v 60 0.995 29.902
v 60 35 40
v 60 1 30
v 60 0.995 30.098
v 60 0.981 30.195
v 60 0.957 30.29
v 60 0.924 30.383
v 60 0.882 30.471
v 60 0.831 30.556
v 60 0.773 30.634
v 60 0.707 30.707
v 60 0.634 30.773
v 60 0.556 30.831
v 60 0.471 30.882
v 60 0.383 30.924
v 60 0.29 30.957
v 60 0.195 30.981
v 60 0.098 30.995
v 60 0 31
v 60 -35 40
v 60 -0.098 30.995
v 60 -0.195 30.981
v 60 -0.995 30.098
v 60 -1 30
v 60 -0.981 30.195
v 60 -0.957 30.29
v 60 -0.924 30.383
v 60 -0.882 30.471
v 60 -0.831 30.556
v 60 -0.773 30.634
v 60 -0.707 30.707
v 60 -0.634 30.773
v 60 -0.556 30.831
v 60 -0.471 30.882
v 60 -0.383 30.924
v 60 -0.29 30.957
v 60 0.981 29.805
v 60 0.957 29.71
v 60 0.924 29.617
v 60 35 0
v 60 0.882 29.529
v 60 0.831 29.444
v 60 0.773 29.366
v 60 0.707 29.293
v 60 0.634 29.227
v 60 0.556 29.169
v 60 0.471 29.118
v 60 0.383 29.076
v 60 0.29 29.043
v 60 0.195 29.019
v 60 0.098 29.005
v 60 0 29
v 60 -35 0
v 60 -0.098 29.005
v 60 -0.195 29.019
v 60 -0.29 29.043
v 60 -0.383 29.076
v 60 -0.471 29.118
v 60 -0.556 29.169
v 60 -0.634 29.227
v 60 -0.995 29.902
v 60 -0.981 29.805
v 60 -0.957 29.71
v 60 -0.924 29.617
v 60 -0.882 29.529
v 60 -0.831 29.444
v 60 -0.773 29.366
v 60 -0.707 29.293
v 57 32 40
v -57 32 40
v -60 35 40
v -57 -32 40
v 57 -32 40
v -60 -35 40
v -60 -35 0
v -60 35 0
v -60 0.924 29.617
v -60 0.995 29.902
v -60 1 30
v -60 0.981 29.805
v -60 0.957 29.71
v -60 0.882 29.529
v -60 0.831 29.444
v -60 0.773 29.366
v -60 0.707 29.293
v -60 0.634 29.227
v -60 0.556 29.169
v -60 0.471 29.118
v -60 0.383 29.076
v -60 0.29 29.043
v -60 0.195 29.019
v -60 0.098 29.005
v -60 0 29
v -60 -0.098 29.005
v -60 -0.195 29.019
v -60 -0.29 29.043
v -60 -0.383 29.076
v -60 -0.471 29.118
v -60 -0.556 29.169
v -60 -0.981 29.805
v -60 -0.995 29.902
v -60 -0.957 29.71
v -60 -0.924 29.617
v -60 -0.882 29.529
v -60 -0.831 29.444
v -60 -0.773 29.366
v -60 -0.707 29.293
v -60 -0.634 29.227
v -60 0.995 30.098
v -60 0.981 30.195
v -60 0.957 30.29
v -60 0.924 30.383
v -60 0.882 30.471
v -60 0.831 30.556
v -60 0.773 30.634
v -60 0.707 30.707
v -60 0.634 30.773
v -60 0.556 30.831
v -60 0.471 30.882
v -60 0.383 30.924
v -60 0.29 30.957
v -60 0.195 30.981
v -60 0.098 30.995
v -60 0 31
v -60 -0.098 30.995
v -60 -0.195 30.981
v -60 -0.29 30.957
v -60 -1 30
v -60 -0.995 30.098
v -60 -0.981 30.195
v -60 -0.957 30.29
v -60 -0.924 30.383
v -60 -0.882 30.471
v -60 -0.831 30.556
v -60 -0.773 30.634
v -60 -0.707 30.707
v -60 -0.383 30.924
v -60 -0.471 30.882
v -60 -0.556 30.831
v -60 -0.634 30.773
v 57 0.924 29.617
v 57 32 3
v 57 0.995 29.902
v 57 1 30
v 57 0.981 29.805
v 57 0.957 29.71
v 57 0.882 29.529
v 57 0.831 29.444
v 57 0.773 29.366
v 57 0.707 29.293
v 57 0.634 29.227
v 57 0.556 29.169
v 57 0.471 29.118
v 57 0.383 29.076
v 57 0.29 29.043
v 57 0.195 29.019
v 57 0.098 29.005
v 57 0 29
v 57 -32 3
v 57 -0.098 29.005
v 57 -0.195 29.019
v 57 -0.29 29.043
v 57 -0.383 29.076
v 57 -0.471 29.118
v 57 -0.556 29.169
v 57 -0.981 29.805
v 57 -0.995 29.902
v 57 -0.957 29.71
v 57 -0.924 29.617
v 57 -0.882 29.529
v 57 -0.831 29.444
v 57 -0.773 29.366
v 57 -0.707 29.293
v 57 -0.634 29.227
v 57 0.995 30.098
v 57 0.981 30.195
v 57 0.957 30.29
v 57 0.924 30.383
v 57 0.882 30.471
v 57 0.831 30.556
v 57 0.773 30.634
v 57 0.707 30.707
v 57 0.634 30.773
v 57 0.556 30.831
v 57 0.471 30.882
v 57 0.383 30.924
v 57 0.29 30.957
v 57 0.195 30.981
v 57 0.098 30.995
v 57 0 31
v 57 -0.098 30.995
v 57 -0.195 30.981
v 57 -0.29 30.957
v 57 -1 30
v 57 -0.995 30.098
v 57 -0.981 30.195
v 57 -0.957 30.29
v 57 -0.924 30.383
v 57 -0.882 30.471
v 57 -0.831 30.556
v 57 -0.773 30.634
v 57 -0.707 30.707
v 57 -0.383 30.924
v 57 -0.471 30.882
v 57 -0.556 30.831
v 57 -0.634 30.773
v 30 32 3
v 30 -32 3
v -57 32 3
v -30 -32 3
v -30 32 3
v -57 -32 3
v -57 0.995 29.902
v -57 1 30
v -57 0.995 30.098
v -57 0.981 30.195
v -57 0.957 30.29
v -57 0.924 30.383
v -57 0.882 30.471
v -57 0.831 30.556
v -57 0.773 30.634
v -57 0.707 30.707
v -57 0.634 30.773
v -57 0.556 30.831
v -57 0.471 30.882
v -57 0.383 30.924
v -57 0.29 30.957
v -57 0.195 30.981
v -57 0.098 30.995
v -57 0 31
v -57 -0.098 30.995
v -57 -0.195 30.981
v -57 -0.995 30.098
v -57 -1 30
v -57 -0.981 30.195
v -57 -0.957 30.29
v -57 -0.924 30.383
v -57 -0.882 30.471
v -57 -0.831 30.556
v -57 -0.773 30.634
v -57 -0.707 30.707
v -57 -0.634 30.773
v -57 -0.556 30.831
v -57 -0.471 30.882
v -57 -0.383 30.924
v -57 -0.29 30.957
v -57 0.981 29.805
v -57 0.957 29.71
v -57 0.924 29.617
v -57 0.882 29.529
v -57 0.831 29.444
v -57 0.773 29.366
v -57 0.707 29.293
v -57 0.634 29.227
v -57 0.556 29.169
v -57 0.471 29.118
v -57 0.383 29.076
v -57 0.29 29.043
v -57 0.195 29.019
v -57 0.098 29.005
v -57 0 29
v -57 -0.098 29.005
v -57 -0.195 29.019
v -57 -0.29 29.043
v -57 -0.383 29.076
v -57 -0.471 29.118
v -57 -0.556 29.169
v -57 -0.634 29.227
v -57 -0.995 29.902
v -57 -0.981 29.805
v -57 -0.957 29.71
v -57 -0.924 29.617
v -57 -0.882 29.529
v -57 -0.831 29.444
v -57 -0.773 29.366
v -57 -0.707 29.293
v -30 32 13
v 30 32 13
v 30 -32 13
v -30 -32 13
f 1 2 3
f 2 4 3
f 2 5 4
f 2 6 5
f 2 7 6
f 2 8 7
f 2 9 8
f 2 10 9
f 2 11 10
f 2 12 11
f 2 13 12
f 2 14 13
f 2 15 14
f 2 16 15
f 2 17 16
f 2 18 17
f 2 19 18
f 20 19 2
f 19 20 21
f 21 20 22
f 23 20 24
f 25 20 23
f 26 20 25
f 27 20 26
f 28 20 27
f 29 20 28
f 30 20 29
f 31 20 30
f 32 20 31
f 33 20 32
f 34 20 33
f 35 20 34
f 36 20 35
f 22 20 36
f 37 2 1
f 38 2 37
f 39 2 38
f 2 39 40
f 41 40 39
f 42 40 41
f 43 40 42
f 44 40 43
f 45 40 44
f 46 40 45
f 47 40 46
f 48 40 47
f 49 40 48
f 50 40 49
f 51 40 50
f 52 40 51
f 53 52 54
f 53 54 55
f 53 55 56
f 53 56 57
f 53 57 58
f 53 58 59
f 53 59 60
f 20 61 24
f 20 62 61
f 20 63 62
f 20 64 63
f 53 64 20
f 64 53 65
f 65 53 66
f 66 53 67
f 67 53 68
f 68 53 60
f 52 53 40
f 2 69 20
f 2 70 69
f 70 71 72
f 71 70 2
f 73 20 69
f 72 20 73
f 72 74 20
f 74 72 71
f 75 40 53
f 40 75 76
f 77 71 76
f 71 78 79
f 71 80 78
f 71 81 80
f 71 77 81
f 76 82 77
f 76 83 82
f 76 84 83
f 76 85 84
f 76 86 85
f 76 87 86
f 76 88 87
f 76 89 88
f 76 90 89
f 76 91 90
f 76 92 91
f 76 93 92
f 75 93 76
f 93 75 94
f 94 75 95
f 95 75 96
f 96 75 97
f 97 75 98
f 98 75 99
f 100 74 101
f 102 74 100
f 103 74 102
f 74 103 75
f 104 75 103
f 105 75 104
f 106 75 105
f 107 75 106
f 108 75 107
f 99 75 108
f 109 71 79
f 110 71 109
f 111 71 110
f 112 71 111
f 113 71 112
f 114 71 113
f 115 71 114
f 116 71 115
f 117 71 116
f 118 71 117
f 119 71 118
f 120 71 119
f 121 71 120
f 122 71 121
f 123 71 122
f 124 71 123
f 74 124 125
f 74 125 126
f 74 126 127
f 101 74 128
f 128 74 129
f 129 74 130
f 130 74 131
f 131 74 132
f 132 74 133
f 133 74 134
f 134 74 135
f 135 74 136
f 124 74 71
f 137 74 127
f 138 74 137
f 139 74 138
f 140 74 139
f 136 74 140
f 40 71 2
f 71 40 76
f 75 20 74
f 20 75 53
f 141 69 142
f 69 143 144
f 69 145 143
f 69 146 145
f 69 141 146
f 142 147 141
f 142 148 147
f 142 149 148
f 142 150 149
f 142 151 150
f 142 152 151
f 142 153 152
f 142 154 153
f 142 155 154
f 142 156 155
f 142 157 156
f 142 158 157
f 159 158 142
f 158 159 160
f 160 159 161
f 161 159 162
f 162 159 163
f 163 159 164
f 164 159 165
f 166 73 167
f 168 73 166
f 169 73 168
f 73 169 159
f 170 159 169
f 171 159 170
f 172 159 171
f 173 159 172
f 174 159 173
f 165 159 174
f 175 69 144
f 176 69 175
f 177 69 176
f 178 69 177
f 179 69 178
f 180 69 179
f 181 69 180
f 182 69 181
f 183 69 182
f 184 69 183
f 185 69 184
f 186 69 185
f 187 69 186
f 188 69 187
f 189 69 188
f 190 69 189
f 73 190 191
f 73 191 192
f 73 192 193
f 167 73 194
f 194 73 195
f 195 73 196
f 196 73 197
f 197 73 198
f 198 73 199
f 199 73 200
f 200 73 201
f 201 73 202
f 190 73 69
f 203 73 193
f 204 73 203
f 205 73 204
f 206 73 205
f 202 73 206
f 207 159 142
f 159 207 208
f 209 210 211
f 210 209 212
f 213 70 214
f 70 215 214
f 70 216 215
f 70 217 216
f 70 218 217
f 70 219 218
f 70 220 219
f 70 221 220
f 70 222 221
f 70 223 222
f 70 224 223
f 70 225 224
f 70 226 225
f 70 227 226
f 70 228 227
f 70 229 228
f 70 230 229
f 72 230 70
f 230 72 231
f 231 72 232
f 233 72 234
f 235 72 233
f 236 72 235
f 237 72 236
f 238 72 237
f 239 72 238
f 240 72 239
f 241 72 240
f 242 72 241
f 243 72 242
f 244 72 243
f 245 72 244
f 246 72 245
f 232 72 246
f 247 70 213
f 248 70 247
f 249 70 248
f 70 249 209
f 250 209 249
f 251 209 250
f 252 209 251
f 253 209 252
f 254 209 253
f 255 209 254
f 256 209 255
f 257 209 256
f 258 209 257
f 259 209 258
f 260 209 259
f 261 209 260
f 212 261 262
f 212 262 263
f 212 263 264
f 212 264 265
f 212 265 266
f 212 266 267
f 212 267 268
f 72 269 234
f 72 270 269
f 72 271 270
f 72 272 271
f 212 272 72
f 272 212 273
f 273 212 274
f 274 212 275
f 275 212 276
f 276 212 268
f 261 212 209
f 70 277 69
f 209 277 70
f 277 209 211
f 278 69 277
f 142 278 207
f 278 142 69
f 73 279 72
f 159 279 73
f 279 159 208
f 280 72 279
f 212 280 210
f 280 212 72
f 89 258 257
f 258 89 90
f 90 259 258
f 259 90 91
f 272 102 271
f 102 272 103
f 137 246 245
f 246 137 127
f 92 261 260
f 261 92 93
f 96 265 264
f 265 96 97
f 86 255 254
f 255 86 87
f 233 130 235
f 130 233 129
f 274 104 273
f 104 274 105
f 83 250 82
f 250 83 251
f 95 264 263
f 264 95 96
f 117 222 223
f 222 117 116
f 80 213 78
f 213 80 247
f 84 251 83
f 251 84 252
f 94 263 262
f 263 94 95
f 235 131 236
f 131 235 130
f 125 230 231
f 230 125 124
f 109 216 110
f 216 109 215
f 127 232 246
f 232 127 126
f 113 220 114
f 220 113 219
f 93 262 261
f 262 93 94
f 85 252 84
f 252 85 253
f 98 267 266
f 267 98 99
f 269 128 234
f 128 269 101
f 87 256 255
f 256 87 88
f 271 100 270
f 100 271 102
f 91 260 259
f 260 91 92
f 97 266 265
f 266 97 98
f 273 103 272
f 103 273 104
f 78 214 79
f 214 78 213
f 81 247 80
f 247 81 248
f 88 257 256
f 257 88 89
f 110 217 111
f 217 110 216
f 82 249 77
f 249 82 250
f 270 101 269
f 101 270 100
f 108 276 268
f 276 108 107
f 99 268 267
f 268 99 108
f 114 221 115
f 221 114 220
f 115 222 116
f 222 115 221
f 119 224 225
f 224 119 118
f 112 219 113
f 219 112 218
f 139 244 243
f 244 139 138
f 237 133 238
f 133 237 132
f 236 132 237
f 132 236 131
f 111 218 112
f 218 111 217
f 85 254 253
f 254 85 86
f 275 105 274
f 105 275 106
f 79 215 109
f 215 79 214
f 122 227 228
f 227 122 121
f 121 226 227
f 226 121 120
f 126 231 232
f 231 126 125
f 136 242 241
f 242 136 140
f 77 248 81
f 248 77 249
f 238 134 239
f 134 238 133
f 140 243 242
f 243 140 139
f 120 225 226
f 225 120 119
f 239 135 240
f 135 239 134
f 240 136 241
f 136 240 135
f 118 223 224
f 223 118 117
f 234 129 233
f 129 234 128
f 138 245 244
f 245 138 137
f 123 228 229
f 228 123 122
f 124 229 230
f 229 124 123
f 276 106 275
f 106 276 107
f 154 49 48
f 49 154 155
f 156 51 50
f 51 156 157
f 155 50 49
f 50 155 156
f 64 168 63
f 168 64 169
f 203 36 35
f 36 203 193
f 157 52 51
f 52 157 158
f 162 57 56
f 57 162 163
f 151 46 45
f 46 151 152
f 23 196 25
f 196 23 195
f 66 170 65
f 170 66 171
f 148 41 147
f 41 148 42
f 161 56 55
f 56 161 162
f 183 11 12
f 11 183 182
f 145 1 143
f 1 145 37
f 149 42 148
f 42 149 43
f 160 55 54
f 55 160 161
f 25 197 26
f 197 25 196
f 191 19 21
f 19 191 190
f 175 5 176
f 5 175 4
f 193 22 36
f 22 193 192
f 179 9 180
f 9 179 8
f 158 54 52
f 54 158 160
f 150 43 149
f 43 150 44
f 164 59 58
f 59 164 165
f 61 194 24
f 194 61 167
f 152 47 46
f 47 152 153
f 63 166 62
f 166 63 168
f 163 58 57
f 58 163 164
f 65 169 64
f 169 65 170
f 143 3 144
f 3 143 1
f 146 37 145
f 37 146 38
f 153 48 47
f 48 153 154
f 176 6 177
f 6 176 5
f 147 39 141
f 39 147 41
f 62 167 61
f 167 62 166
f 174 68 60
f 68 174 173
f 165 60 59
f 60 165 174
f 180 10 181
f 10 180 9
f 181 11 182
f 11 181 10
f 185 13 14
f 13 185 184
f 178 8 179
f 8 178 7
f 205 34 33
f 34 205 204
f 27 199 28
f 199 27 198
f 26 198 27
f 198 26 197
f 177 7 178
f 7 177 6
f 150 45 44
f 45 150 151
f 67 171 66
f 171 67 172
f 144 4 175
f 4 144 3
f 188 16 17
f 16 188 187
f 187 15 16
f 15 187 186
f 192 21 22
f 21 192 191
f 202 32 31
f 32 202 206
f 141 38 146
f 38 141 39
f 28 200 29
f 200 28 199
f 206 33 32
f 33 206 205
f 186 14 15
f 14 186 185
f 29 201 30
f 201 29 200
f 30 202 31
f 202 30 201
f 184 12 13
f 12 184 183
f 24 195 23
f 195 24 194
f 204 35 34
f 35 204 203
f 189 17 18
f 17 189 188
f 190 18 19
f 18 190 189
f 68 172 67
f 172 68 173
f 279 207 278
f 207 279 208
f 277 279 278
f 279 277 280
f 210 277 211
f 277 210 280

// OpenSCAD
// Buffer tank for mini gel-electrophoresis box

// Dimensions (mm)
outer_x = 120;          // outer width in X
outer_y = 70;           // outer depth in Y
outer_z = 40;           // outer height in Z
wall_t = 3;             // wall thickness
floor_t = 3;            // floor thickness
platform_len_x = 60;    // platform length in X (centered)
platform_top_z = 13;    // platform top height
electrode_hole_d = 2;   // electrode hole diameter
electrode_hole_z = 30;  // electrode hole height

// Calculated dimensions
inner_x = outer_x - 2 * wall_t;
inner_y = outer_y - 2 * wall_t;

// Tank center positions
tank_x_min = -outer_x / 2;
tank_x_max = outer_x / 2;
tank_y_min = -outer_y / 2;
tank_y_max = outer_y / 2;

// Inner cavity positions
inner_x_min = tank_x_min + wall_t;
inner_x_max = tank_x_max - wall_t;
inner_y_min = tank_y_min + wall_t;
inner_y_max = tank_y_max - wall_t;

// Platform dimensions
platform_x_min = -platform_len_x / 2;
platform_z_height = platform_top_z - floor_t;

$fn = 64;

// Main tank body (outer box with inner cavity subtracted)
difference() {
    // Outer box
    translate([tank_x_min, tank_y_min, 0])
        cube([outer_x, outer_y, outer_z]);
    
    // Inner cavity (open top)
    translate([inner_x_min, inner_y_min, floor_t])
        cube([inner_x, inner_y, outer_z - floor_t + 1]);
    
    // Left electrode hole (through left end wall at X = -60)
    translate([-61, 0, electrode_hole_z])
        rotate([0, 90, 0])
            cylinder(h = 5, r = electrode_hole_d / 2);
    
    // Right electrode hole (through right end wall at X = 60)
    translate([56, 0, electrode_hole_z])
        rotate([0, 90, 0])
            cylinder(h = 5, r = electrode_hole_d / 2);
}

// Raised platform for gel tray
translate([platform_x_min, inner_y_min, floor_t])
    cube([platform_len_x, inner_y, platform_z_height]);
